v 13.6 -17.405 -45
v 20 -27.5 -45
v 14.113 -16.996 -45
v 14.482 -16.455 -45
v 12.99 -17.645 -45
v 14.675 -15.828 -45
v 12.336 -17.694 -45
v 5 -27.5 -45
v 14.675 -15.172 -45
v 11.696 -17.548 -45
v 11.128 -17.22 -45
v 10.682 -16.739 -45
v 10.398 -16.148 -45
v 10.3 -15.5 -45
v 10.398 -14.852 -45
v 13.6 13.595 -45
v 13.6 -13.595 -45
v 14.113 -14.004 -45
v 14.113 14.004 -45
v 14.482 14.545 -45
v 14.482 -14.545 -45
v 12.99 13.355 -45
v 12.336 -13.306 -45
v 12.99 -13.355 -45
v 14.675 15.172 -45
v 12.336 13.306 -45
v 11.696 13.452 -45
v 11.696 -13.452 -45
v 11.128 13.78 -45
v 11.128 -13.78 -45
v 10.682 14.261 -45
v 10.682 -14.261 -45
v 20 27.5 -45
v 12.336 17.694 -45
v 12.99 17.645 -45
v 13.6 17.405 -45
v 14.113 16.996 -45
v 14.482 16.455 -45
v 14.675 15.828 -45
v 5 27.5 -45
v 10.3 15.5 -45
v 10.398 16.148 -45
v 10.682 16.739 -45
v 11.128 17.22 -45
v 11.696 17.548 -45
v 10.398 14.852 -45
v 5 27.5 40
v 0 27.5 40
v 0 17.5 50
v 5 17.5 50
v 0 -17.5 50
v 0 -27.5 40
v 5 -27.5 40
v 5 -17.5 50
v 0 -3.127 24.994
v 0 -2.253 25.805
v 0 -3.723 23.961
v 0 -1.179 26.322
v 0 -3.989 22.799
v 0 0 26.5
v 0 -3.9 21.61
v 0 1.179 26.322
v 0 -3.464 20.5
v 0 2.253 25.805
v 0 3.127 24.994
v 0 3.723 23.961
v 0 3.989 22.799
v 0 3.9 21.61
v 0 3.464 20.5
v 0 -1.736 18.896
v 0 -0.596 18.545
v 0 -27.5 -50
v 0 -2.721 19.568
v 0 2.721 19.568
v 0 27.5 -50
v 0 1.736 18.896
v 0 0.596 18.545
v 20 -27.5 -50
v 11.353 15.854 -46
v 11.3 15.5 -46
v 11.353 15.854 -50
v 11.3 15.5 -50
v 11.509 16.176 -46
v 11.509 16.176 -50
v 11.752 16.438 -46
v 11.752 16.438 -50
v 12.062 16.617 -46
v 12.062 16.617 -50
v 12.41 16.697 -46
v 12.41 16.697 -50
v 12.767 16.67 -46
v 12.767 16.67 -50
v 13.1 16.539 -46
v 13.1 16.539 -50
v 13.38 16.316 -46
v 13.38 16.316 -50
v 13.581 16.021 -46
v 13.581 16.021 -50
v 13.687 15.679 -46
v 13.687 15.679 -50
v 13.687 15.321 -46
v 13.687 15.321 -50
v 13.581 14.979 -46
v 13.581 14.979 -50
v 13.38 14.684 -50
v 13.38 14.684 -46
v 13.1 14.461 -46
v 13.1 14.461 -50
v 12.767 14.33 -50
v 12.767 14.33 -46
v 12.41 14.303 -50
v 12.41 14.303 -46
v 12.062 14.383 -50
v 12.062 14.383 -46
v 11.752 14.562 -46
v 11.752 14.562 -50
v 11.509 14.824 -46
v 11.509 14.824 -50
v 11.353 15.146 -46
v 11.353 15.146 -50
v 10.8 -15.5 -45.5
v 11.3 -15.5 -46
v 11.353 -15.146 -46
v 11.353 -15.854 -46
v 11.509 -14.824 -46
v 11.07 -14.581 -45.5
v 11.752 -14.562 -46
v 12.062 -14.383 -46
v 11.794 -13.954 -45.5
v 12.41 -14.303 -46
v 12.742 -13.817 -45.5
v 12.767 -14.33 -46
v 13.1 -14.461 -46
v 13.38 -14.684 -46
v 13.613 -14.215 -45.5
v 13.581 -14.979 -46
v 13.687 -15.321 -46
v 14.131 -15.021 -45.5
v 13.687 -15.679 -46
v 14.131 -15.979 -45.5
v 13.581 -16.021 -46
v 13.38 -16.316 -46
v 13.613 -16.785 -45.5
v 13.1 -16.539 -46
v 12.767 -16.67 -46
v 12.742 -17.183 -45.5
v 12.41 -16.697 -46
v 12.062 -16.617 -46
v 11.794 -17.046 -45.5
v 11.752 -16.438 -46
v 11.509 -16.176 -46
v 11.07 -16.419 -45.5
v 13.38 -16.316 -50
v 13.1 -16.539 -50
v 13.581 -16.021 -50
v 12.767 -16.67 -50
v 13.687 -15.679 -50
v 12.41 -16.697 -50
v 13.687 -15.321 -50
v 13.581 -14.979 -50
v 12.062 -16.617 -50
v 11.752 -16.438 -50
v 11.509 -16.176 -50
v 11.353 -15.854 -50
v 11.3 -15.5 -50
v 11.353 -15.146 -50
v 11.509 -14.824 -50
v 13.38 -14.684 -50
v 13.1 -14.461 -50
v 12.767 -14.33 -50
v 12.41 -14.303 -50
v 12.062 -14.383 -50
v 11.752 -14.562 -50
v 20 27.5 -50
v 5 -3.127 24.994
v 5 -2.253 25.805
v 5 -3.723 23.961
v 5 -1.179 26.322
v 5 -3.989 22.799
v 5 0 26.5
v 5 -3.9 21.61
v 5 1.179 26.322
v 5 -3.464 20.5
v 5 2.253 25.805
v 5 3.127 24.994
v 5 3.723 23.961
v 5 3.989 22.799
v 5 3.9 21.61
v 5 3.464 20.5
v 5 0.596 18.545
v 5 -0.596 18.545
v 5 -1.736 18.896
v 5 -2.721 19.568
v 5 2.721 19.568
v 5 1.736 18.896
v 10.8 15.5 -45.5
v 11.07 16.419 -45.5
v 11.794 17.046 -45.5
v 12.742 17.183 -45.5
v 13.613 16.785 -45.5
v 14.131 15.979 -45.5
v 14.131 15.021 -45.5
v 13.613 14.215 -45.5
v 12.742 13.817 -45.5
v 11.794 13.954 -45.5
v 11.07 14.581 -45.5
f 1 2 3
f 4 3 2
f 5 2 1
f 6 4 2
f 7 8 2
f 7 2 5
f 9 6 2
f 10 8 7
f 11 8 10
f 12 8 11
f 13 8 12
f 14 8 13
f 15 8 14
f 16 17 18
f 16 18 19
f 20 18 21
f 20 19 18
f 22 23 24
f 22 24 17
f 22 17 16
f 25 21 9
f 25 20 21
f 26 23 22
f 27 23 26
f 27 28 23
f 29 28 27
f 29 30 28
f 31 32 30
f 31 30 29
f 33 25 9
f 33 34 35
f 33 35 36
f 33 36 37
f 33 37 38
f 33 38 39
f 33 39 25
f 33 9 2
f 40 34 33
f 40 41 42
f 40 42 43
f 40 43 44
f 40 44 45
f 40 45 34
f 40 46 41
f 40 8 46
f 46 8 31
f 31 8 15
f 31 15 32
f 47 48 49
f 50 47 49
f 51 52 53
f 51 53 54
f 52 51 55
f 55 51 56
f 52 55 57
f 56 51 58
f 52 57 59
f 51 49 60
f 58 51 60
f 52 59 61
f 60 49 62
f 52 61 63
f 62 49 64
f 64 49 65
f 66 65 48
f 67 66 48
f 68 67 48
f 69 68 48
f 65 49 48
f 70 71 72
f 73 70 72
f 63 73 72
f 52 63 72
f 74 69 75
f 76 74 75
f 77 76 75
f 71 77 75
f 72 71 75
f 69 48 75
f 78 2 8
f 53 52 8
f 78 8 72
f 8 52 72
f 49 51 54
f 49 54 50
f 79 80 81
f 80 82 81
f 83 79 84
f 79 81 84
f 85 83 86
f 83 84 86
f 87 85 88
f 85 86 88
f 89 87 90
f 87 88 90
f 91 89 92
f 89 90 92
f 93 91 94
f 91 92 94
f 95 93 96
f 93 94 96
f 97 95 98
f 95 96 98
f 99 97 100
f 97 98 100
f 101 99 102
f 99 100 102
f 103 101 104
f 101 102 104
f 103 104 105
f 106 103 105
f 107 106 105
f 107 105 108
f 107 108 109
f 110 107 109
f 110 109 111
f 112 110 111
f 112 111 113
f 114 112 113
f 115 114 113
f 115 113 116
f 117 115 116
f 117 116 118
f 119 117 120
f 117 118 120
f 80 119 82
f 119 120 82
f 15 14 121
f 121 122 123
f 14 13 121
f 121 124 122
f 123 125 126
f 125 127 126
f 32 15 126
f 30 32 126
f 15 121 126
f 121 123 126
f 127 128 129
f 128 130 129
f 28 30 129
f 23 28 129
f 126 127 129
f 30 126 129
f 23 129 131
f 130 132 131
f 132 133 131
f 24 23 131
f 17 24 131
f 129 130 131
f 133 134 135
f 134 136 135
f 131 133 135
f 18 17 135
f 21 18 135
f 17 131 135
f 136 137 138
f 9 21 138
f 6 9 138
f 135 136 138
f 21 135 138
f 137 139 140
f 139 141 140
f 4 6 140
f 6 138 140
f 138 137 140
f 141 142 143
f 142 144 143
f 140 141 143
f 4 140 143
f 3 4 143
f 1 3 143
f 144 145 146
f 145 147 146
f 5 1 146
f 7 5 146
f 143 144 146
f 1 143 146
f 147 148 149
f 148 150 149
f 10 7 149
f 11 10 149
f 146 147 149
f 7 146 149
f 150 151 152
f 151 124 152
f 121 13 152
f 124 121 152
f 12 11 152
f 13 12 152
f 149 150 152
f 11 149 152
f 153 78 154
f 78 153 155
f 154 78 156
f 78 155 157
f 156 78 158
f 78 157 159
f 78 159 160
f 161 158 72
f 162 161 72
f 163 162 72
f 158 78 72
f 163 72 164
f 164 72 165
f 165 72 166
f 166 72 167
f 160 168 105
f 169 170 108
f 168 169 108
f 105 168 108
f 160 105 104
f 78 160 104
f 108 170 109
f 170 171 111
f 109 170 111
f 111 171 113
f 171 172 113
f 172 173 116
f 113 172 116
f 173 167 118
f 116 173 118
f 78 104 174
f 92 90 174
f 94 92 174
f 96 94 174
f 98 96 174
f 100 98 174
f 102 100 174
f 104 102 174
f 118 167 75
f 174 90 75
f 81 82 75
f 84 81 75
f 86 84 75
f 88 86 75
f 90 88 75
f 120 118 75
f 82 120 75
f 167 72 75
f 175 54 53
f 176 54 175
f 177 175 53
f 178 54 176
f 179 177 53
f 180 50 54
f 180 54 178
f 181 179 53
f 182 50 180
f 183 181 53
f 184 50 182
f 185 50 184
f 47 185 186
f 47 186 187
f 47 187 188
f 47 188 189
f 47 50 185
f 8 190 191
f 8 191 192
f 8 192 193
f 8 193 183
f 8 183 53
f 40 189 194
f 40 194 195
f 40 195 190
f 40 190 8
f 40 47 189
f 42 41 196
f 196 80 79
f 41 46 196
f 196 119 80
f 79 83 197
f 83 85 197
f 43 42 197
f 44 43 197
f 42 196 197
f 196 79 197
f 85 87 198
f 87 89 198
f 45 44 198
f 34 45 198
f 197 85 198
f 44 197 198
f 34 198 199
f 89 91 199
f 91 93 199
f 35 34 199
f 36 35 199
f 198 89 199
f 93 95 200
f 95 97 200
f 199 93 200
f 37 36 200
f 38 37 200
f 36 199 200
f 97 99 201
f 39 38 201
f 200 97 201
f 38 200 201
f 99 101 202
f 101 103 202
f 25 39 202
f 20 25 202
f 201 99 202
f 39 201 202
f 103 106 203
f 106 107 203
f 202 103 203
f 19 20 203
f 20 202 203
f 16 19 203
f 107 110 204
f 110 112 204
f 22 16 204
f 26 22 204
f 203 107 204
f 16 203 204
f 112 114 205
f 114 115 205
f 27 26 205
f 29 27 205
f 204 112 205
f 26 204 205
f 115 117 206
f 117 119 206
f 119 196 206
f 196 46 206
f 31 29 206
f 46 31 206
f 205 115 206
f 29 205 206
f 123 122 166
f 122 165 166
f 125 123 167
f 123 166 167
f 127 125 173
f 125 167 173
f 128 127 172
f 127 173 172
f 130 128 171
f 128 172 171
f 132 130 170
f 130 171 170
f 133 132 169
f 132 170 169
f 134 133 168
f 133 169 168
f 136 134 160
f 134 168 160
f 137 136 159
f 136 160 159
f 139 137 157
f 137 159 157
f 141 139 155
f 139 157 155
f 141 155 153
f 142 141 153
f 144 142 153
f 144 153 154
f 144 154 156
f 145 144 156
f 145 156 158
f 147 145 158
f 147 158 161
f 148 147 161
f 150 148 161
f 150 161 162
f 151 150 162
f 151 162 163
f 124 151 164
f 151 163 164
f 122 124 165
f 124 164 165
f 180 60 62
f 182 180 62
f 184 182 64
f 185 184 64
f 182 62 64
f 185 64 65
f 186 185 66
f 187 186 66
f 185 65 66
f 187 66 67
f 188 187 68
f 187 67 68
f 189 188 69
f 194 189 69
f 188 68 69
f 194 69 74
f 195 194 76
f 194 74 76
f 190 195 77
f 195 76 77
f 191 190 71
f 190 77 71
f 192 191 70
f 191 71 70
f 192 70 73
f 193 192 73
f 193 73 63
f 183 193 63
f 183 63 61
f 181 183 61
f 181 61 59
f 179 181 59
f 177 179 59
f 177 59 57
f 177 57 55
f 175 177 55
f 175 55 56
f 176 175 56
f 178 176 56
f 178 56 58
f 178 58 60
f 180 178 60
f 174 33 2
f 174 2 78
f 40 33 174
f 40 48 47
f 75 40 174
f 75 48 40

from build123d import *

# Parameters (mm, degrees)
SKETCH1_W                                       = 100
SKETCH1_H                                       = 55
BOSS_EXTRUDE1_DEPTH                             = 5
SKETCH2_W                                       = 5
SKETCH2_H                                       = 55
BOSS_EXTRUDE2_DEPTH                             = 15
CUT_EXTRUDE1_REACH                              = 22
CSK_FOR_M2_FLAT_HEAD_MACHINE_SCREW1_D           = 2.4
CSK_FOR_M2_FLAT_HEAD_MACHINE_SCREW1_CSINK_D     = 4.4
CSK_FOR_M2_FLAT_HEAD_MACHINE_SCREW1_CSINK_ANGLE = 90
CUT_EXTRUDE2_REACH                              = 22
SKETCH6_R                                       = 4


with BuildPart() as part:
    # Sketch1 → Boss-Extrude1 (new body)
    with BuildSketch(Plane(origin=(0, 0, 0), x_dir=(0, 0, -1), z_dir=(1, 0, 0))):
        Rectangle(SKETCH1_W, SKETCH1_H)
    extrude(amount=BOSS_EXTRUDE1_DEPTH)

    # Sketch2 → Boss-Extrude2 (add)
    with BuildSketch(Plane(origin=(5, 0, 0), x_dir=(0, 0, -1), z_dir=(1, 0, 0))):
        with Locations((47.5, 0)):
            Rectangle(SKETCH2_W, SKETCH2_H)
    extrude(amount=BOSS_EXTRUDE2_DEPTH)

    # Sketch3 → Cut-Extrude1 (cut, up to next)
    with BuildSketch(Plane.ZY, mode=Mode.PRIVATE) as cut_extrude1_sk1:
        Polygon((50, 27.5), (40, 27.5), (50, 17.5), align=None)
    cut_extrude1_tool1 = extrude(cut_extrude1_sk1.sketch, amount=-CUT_EXTRUDE1_REACH, mode=Mode.PRIVATE) & part.part
    add(cut_extrude1_tool1.solids().sort_by_distance((0, 24.166667, 46.666667))[0], mode=Mode.SUBTRACT)
    # Sketch3 → Cut-Extrude1 (cut, up to next)
    with BuildSketch(Plane.ZY, mode=Mode.PRIVATE) as cut_extrude1_sk2:
        Polygon((50, -27.5), (40, -27.5), (50, -17.5), align=None)
    cut_extrude1_tool2 = extrude(cut_extrude1_sk2.sketch, amount=-CUT_EXTRUDE1_REACH, mode=Mode.PRIVATE) & part.part
    add(cut_extrude1_tool2.solids().sort_by_distance((0, -24.166667, 46.666667))[0], mode=Mode.SUBTRACT)

    # CSK for M2 Flat Head Machine Screw1 (through all)
    with Locations(Plane.XY.offset(-45)):
        with Locations((12.5, 15.5), (12.5, -15.5)):
            CounterSinkHole(CSK_FOR_M2_FLAT_HEAD_MACHINE_SCREW1_D / 2, CSK_FOR_M2_FLAT_HEAD_MACHINE_SCREW1_CSINK_D / 2, counter_sink_angle=CSK_FOR_M2_FLAT_HEAD_MACHINE_SCREW1_CSINK_ANGLE)

    # Sketch6 → Cut-Extrude2 (cut, up to next)
    with BuildSketch(Plane.ZY, mode=Mode.PRIVATE) as cut_extrude2_sk1:
        with Locations((22.5, 0)):
            Circle(SKETCH6_R)
    cut_extrude2_tool1 = extrude(cut_extrude2_sk1.sketch, amount=-CUT_EXTRUDE2_REACH, mode=Mode.PRIVATE) & part.part
    add(cut_extrude2_tool1.solids().sort_by_distance((0, 0, 22.5))[0], mode=Mode.SUBTRACT)


solid = part.part
